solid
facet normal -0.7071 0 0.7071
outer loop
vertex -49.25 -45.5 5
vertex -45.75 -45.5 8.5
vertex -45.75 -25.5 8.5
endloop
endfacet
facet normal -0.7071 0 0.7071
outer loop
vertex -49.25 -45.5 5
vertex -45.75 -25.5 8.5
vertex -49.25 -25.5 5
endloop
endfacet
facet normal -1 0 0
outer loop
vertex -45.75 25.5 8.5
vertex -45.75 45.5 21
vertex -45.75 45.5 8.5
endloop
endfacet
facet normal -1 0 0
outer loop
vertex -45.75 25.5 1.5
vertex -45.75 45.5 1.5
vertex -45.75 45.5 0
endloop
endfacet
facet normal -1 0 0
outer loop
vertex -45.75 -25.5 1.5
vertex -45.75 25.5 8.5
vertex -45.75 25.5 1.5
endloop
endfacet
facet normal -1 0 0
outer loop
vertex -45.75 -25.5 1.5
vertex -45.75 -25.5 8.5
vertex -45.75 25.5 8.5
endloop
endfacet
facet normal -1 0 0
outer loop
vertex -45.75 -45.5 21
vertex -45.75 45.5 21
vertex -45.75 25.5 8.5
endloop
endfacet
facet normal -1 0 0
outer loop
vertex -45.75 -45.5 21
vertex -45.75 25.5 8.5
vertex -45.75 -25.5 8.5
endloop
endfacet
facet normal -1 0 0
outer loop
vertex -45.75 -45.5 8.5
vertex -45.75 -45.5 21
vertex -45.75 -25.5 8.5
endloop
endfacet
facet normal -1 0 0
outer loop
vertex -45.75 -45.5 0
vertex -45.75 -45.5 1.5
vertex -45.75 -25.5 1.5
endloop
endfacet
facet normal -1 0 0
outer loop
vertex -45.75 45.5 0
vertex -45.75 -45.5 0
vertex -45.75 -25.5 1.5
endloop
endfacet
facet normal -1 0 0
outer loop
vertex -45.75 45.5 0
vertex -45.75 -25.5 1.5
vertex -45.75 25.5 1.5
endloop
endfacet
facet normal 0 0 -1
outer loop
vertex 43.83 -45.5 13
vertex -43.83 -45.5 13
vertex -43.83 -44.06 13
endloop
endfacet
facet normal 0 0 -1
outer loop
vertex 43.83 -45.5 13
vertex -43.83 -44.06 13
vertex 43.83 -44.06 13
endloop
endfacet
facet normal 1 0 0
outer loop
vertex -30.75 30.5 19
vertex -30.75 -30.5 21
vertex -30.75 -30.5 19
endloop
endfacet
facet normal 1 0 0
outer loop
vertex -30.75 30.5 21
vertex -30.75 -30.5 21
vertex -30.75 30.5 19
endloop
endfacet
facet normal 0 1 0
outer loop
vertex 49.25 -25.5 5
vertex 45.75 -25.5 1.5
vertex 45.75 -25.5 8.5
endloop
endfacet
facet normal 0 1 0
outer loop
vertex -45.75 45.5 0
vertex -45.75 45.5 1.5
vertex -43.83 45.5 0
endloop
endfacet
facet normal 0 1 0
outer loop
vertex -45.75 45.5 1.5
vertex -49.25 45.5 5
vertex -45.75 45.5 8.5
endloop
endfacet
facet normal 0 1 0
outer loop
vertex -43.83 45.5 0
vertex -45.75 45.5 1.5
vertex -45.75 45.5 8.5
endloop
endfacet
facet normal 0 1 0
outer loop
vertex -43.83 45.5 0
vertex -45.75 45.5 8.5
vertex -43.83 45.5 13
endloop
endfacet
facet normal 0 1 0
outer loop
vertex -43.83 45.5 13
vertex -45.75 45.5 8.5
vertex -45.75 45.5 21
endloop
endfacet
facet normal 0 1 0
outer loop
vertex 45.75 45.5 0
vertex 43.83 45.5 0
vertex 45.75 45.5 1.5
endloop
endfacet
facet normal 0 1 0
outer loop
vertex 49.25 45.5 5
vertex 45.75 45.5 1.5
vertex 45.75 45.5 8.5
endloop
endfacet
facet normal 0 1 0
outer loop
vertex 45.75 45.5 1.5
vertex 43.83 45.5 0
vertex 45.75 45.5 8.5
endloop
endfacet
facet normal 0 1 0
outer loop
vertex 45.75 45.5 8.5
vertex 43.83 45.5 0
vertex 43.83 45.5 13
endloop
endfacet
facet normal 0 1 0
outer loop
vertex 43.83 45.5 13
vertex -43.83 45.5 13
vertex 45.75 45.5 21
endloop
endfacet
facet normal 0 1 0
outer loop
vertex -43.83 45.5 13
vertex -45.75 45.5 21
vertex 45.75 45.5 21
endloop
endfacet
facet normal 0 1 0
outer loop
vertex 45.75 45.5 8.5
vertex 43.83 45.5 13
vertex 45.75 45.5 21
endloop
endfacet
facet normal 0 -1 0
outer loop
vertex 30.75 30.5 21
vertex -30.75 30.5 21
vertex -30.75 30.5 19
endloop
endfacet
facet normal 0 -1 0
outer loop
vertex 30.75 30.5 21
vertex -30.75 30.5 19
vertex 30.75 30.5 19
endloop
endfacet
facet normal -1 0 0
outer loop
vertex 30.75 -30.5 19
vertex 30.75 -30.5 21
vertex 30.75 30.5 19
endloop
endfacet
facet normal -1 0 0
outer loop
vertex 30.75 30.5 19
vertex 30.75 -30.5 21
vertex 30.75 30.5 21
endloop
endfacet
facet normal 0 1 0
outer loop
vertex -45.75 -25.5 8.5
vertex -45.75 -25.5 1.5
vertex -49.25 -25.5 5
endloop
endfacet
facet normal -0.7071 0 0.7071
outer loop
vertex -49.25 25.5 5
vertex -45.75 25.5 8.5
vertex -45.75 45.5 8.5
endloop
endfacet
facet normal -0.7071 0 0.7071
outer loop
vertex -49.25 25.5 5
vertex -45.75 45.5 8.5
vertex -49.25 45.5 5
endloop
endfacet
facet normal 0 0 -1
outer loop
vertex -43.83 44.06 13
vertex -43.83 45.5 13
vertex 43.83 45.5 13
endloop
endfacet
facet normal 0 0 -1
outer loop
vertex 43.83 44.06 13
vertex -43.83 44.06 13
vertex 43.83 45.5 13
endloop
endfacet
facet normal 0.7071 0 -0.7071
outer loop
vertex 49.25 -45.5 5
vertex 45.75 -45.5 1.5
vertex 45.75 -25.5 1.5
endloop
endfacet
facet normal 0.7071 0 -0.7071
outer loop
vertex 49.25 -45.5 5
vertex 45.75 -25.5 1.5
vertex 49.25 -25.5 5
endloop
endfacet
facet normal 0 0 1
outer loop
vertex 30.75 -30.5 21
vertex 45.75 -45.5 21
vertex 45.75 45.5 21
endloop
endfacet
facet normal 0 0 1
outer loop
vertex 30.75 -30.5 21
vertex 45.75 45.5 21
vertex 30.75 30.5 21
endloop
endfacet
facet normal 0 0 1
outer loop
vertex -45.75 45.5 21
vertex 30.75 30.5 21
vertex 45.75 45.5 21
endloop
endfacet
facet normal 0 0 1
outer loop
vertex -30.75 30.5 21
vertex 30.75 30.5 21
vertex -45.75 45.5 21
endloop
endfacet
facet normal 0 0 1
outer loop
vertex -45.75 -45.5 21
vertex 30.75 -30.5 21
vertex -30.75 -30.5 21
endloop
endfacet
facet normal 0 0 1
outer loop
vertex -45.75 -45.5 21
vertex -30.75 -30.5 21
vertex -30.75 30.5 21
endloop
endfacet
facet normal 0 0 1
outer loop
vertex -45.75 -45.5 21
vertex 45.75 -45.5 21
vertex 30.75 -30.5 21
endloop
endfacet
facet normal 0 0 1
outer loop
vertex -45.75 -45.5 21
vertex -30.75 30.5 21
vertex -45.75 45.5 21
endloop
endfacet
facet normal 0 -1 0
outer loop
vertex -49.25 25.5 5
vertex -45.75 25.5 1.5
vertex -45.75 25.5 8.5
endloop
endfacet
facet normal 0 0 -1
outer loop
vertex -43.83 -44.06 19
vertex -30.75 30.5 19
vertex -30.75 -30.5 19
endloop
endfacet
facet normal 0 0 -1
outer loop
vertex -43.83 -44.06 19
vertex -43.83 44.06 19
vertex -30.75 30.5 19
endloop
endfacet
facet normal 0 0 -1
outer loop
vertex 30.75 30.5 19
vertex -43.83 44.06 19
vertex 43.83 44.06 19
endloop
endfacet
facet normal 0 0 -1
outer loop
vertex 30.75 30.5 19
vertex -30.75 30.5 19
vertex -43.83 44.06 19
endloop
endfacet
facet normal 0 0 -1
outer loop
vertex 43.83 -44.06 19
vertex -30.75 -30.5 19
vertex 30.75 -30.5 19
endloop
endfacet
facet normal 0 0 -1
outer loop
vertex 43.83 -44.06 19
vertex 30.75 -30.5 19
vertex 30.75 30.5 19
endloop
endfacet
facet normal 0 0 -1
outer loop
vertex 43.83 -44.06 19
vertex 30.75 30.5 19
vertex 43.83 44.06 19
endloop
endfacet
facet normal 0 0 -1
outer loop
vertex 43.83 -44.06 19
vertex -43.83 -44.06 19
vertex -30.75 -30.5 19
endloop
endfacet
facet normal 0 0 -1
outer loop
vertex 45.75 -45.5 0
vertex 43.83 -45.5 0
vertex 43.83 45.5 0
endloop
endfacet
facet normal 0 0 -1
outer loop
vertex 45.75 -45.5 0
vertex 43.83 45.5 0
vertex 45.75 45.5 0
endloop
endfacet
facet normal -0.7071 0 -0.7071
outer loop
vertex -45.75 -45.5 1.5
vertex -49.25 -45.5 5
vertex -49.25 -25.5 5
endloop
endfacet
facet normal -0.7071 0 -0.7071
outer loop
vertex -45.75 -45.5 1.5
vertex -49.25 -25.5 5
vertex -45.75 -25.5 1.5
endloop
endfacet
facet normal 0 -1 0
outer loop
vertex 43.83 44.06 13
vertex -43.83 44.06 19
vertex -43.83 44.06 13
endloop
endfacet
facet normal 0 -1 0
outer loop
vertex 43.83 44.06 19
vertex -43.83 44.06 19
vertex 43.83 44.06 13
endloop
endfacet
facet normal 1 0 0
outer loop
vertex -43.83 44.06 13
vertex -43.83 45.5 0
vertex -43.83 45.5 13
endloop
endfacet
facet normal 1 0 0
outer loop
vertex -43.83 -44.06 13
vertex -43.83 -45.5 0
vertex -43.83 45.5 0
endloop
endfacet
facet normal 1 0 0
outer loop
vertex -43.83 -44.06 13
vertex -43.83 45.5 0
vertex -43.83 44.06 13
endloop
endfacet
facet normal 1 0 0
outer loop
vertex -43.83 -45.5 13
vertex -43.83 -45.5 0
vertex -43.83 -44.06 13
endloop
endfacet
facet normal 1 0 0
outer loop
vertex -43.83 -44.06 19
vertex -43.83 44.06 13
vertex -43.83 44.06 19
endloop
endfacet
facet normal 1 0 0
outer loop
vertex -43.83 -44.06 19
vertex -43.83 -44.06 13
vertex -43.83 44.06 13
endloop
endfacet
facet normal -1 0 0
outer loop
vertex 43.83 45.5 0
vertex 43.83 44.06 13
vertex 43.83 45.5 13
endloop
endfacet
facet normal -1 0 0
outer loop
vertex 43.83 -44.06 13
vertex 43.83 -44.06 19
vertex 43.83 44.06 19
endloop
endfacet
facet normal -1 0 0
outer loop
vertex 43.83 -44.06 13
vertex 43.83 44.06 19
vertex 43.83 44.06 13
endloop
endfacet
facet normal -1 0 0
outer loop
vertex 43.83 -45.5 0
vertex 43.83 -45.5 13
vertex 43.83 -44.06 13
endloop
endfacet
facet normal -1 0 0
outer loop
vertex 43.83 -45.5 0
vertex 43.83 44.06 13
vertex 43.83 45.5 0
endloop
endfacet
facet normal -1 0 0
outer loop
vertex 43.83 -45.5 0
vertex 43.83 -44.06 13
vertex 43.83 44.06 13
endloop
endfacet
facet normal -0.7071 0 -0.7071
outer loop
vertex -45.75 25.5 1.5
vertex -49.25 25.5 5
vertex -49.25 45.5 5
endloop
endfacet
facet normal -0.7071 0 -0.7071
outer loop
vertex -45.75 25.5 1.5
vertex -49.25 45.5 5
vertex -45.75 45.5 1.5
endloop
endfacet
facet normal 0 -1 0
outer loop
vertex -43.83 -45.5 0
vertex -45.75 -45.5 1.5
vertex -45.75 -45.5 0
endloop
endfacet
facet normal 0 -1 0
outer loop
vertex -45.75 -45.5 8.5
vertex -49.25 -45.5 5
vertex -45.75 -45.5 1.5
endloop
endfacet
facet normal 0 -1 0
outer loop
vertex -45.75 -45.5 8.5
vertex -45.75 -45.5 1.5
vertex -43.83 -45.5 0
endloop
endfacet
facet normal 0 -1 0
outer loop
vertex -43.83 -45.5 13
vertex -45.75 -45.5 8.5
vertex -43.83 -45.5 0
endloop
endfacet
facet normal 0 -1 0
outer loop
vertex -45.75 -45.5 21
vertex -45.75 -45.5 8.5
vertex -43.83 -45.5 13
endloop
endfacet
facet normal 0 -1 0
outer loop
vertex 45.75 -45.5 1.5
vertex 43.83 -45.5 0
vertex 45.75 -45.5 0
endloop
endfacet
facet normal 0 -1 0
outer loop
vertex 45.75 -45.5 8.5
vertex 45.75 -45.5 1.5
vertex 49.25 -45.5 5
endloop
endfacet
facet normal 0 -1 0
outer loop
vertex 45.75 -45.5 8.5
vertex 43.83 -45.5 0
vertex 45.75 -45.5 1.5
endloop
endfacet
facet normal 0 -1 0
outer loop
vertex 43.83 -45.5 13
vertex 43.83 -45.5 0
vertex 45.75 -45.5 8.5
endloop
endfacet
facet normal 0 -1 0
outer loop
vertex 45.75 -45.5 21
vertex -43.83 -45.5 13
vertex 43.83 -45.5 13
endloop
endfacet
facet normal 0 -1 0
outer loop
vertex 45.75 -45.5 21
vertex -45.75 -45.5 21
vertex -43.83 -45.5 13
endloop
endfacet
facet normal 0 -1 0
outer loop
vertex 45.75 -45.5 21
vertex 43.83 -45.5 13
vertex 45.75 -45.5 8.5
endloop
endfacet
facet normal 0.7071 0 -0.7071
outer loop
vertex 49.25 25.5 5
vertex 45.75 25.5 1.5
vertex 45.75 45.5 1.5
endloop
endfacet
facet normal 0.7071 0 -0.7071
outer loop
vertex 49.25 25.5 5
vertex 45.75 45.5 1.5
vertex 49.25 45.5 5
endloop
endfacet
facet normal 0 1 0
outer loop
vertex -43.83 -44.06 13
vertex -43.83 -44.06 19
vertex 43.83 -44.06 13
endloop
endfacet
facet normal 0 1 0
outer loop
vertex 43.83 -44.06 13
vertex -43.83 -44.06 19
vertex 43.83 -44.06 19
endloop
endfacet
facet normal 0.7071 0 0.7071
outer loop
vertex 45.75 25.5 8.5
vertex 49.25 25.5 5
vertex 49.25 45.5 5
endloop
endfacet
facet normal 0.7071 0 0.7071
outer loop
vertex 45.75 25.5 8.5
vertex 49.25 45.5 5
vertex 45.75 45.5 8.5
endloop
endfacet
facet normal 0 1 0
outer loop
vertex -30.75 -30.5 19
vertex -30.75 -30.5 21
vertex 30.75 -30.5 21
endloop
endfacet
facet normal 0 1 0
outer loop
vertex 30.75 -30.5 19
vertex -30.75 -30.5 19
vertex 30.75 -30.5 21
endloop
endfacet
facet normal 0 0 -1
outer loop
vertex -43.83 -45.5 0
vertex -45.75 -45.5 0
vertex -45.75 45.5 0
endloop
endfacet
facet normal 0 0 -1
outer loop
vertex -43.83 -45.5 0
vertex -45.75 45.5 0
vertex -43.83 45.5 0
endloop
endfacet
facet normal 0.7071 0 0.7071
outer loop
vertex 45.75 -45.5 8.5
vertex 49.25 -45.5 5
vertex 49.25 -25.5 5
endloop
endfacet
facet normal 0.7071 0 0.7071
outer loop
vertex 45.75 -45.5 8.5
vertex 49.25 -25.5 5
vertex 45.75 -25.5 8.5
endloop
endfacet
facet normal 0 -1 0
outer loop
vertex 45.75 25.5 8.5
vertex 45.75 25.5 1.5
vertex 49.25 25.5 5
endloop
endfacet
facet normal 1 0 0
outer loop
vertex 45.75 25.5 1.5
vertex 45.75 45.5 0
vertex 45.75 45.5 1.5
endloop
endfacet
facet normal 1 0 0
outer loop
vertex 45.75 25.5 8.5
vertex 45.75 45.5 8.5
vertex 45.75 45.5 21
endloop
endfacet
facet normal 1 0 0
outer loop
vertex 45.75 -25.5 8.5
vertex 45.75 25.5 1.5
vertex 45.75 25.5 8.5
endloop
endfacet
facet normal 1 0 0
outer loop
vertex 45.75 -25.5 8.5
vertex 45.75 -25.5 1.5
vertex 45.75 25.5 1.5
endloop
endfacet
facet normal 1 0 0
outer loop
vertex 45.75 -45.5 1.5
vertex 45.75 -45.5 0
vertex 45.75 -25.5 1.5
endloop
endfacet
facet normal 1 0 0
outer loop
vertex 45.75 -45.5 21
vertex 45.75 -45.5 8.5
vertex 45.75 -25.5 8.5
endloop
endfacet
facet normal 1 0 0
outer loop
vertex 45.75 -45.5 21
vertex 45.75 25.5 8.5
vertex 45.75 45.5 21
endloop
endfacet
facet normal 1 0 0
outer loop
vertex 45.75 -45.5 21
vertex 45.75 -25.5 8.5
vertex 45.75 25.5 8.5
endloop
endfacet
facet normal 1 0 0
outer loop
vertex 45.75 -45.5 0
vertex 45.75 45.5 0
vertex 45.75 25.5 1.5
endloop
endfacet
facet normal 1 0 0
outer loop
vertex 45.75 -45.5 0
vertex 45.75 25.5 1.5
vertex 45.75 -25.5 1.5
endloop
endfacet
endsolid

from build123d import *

# Parameters (mm, degrees)
F1_DEPTH = 45.5
F2_W     = 61.5
F2_H     = 61
F3_DEPTH = 21.001
F4_W     = 3.5
F4_H     = 51
F5_DEPTH = 21.001
F6_W     = 87.66
F6_H     = 1.44
F7_DEPTH = 6


# Not quite as in the source:
# - a pattern or mirror of a feature is missing from the dataset's text; its kind, count and spacing are read off the source's solid


with BuildPart() as f1:
    # F0 (on Front) → F1 (new body, symmetric)
    with BuildSketch(Plane.XZ):
        Polygon((45.75, 21), (-45.75, 21), (-45.75, 8.5), (-49.25, 5), (-45.75, 1.5), (-45.75, 0), (-43.83, 0), (-43.83, 19), (43.83, 19), (43.83, 0), (45.75, 0), (45.75, 1.5), (49.25, 5), (45.75, 8.5), align=None)
    extrude(amount=F1_DEPTH, both=True)

    # F2 (on face) → F3 (cut, through all)
    with BuildSketch(Plane.XY.offset(21)):
        Rectangle(F2_W, F2_H)
    extrude(amount=-F3_DEPTH, mode=Mode.SUBTRACT)

    # F4 (on face) → F5 (cut, through all)
    with BuildSketch(Plane.XY.offset(21)):
        with Locations((47.5, 0)):
            Rectangle(F4_W, F4_H)
    f5 = extrude(amount=-F5_DEPTH, mode=Mode.SUBTRACT)

    # F5_copies: F5 across plane
    add(f5.mirror(Plane(origin=(0, 0, 0), x_dir=(0, 0, -1), z_dir=(-1, 0, 0))), mode=Mode.SUBTRACT)

    # F6 (on face) → F7 (join)
    with BuildSketch(Plane(origin=(0, 0, 19), x_dir=(1, 0, 0), z_dir=(0, 0, -1))):
        with Locations((0, 44.78)):
            Rectangle(F6_W, F6_H)
    f7 = extrude(amount=F7_DEPTH)

    # F7_copies: F7 across plane
    add(f7.mirror(Plane.ZX))


solid = f1.part
